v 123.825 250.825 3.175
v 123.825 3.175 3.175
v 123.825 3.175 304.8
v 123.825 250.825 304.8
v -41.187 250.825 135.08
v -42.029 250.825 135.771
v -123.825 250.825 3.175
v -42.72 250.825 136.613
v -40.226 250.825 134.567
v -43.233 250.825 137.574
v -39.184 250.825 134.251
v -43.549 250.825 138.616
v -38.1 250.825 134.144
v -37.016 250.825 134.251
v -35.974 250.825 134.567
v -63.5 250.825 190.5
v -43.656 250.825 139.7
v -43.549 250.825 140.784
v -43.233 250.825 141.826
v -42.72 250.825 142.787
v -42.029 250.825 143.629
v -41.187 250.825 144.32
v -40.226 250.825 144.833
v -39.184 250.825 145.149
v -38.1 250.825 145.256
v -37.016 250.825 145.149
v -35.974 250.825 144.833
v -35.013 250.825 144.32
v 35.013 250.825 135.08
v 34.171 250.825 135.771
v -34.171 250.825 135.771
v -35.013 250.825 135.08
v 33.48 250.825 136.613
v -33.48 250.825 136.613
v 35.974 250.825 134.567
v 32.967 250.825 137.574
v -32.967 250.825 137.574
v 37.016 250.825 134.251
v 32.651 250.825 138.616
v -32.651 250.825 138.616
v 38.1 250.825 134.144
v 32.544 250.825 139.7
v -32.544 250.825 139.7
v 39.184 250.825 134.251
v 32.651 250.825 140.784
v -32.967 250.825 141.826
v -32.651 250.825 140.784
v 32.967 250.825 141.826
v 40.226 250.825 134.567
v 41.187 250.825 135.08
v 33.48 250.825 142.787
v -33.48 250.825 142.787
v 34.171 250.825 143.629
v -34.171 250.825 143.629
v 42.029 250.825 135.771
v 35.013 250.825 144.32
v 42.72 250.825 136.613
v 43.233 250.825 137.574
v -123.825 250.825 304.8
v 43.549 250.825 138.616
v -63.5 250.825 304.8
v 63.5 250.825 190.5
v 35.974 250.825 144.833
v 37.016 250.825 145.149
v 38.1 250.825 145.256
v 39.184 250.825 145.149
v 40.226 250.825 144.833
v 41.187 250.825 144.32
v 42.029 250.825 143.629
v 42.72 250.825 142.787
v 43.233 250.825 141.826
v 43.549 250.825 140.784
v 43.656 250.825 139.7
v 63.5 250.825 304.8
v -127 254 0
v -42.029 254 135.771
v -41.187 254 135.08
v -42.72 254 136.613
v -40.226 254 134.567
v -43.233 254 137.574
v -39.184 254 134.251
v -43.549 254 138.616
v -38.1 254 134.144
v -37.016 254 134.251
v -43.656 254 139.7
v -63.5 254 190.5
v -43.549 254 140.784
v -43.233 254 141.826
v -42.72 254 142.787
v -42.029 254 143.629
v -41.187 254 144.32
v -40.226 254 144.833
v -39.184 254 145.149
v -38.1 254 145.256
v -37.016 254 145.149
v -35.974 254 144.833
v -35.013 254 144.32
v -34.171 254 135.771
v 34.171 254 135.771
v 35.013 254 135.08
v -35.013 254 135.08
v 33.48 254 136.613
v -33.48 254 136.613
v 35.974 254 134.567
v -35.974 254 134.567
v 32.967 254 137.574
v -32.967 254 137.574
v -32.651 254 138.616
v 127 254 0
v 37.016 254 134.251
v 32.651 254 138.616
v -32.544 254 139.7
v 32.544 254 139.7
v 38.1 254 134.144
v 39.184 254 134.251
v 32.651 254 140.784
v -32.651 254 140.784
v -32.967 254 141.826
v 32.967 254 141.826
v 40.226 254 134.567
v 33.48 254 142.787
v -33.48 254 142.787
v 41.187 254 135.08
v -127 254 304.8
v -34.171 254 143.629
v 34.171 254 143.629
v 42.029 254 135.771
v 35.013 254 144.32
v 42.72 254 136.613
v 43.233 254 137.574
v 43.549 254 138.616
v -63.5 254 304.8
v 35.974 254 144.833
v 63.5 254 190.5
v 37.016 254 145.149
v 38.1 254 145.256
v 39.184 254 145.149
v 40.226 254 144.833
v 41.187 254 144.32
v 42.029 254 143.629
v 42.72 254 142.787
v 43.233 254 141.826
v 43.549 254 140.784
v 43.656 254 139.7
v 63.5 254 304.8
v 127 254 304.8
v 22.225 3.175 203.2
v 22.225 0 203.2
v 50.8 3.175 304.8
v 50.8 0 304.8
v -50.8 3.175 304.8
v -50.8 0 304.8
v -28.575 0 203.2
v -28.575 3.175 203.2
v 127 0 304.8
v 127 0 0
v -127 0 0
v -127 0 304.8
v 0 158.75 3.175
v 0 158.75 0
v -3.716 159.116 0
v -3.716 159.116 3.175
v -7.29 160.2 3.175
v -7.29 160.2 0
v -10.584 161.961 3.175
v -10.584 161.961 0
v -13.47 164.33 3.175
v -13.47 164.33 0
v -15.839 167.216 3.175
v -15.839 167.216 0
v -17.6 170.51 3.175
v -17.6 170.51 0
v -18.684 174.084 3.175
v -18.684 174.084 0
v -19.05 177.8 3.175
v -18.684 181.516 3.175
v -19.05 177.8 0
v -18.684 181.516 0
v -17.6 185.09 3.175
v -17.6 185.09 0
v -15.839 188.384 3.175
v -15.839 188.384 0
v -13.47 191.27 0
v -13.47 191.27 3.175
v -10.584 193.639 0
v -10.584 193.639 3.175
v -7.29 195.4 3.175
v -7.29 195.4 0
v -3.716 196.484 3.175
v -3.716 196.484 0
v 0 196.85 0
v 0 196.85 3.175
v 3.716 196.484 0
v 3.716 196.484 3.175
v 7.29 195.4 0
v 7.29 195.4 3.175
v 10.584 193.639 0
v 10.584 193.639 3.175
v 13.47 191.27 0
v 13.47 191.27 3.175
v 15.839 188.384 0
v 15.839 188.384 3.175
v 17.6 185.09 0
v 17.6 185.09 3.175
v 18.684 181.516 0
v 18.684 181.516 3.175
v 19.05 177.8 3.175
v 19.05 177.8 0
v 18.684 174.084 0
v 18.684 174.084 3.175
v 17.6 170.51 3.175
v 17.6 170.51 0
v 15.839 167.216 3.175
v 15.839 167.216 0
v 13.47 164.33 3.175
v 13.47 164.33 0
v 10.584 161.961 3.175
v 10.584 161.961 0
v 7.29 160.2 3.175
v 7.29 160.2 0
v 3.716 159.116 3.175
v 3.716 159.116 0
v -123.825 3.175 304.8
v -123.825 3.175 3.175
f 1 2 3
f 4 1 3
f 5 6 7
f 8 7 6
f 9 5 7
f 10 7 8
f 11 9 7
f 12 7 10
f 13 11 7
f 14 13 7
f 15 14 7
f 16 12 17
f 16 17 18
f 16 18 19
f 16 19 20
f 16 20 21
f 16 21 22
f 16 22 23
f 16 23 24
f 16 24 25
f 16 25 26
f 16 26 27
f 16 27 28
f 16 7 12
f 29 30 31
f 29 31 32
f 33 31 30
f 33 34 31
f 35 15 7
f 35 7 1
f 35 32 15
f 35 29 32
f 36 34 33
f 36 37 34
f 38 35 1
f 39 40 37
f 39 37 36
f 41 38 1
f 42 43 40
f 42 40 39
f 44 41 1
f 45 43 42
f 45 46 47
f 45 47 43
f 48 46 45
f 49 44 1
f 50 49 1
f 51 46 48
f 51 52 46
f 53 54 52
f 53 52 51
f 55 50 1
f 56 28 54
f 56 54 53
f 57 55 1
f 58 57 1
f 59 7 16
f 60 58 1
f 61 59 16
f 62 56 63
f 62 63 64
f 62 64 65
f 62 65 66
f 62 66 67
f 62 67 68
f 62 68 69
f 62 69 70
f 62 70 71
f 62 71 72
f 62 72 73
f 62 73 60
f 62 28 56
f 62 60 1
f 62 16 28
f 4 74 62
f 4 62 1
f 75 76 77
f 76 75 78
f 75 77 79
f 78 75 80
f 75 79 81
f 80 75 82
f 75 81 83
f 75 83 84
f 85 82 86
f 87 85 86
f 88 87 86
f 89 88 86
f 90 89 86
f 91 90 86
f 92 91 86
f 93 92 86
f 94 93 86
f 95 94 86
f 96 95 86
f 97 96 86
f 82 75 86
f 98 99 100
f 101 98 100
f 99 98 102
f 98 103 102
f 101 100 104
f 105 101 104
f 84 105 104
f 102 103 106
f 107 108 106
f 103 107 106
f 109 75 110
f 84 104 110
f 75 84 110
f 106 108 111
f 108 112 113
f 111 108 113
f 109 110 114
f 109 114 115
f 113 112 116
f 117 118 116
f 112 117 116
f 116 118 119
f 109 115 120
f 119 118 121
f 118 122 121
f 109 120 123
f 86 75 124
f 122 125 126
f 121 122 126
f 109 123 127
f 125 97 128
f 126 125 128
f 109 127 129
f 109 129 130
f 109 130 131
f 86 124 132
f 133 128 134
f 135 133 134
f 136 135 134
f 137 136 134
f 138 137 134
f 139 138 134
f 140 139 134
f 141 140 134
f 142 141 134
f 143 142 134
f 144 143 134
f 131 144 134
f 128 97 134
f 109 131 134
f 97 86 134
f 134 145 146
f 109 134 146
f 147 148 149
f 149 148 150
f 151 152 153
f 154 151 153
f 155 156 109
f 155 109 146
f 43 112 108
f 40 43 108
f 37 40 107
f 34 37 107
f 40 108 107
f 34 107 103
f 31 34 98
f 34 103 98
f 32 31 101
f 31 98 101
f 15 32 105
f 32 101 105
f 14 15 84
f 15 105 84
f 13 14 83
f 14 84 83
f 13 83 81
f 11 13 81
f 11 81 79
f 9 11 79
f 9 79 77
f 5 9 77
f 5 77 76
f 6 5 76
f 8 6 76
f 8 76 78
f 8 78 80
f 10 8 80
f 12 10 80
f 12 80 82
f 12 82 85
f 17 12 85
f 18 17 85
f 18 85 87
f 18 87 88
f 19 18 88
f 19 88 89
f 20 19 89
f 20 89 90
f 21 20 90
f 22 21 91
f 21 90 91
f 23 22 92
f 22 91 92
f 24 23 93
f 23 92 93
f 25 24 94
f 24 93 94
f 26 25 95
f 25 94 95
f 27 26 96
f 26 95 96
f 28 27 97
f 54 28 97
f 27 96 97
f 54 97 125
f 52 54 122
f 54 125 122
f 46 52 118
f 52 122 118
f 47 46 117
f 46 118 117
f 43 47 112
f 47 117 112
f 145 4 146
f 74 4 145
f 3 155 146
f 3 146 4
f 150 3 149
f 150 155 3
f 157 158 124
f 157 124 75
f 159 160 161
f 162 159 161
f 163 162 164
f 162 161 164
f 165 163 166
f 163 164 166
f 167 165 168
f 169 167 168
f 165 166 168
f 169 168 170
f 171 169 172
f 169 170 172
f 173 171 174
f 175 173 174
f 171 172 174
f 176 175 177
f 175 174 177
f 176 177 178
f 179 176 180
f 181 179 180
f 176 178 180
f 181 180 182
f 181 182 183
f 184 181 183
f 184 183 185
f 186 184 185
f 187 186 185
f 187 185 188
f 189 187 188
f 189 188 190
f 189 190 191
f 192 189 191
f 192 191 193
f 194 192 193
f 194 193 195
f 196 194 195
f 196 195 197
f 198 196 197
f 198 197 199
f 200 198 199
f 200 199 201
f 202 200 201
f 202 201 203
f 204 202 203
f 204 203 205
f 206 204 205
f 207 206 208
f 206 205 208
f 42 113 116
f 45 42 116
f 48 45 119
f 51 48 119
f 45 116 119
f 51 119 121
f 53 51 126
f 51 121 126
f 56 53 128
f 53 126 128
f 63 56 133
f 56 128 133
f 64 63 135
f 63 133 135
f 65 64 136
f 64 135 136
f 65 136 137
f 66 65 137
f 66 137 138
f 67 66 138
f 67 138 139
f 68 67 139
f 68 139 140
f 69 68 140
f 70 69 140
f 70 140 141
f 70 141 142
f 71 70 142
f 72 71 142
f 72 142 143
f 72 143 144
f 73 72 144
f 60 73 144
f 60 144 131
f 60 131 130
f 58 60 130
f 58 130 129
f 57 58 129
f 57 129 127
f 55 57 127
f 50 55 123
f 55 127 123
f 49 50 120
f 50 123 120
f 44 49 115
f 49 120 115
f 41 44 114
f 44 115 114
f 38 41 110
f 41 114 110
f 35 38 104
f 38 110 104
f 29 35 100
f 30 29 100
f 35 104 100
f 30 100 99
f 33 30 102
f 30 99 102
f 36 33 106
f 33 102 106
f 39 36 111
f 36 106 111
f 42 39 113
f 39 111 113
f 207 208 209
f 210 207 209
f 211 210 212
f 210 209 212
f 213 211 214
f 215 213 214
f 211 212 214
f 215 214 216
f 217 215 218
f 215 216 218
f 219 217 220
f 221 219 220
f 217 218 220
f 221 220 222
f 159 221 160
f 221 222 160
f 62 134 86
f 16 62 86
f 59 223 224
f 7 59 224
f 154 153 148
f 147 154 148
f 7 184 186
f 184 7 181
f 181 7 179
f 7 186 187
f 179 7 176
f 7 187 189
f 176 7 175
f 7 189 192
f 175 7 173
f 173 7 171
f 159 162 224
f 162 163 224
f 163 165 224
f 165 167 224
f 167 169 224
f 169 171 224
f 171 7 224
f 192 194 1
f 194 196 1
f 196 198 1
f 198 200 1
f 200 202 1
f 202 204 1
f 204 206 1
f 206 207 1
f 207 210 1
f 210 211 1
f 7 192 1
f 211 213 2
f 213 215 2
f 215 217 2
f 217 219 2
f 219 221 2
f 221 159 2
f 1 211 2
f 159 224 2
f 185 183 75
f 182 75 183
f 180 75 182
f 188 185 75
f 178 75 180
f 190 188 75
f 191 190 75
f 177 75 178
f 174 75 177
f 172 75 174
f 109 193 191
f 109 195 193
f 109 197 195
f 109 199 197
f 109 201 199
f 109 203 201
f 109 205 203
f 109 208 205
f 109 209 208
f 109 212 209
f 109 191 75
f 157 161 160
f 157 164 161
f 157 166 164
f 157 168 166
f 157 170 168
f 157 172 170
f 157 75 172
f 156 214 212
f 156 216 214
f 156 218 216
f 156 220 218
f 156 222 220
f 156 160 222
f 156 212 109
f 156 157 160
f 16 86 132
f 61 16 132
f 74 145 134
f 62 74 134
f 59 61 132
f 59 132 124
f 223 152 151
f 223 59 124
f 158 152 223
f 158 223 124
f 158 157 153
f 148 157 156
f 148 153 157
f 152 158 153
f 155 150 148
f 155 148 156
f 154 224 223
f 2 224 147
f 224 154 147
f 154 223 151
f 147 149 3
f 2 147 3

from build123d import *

# Parameters (mm, degrees)
F1_DEPTH  = 254
F2_T      = -3.175
F4_DEPTH  = 25.4
F6_DEPTH  = 25.4
F8_DEPTH  = 25.4
F9_R      = 5.55625
F10_DEPTH = 25.4


with BuildPart() as f1:
    # F0 (on Front) → F1 (new body)
    with BuildSketch(Plane.XZ):
        Polygon((-127, 0), (0, 0), (127, 0), (127, 304.8), (-127, 304.8), align=None)
    extrude(amount=-F1_DEPTH)

    # F2
    f2_openings = [f1.faces().sort_by_distance(p)[0] for p in [
        (0, 127, 304.8),
    ]]
    offset(amount=F2_T, openings=f2_openings)

    # F3 (on face) → F4 (cut)
    with BuildSketch(Plane.XZ):
        Polygon((50.8, 304.8), (-50.8, 304.8), (-28.575, 203.2), (22.225, 203.2), align=None)
    extrude(amount=-F4_DEPTH, mode=Mode.SUBTRACT)

    # F5 (on face) → F6 (cut)
    with BuildSketch(Plane(origin=(0, 254, 0), x_dir=(-1, 0, 0), z_dir=(0, 1, 0))):
        Polygon((-16.939813, 304.8), (-63.5, 304.8), (-63.5, 190.5), (-16.939813, 190.5), (63.5, 190.5), (63.5, 304.8), align=None)
    extrude(amount=-F6_DEPTH, mode=Mode.SUBTRACT)

    # F7 (on face) → F8 (cut)
    with BuildSketch(Plane(origin=(0, 0, 0), x_dir=(1, 0, 0), z_dir=(0, 0, -1))):
        with BuildLine():
            ThreePointArc((0, -158.75), (-13.470384, -191.270384), (19.05, -177.8))
            ThreePointArc((19.05, -177.8), (13.470384, -164.329616), (0, -158.75))
        make_face()
    extrude(amount=-F8_DEPTH, mode=Mode.SUBTRACT)

    # F9 (on face) → F10 (cut)
    with BuildSketch(Plane(origin=(0, 254, 0), x_dir=(-1, 0, 0), z_dir=(0, 1, 0))):
        with BuildLine():
            ThreePointArc((43.65625, 139.7), (38.1, 145.25625), (32.54375, 139.7))
            ThreePointArc((32.54375, 139.7), (38.1, 134.14375), (43.65625, 139.7))
        make_face()
        with Locations((-38.1, 139.7)):
            Circle(F9_R)
    extrude(amount=-F10_DEPTH, mode=Mode.SUBTRACT)


solid = f1.part
